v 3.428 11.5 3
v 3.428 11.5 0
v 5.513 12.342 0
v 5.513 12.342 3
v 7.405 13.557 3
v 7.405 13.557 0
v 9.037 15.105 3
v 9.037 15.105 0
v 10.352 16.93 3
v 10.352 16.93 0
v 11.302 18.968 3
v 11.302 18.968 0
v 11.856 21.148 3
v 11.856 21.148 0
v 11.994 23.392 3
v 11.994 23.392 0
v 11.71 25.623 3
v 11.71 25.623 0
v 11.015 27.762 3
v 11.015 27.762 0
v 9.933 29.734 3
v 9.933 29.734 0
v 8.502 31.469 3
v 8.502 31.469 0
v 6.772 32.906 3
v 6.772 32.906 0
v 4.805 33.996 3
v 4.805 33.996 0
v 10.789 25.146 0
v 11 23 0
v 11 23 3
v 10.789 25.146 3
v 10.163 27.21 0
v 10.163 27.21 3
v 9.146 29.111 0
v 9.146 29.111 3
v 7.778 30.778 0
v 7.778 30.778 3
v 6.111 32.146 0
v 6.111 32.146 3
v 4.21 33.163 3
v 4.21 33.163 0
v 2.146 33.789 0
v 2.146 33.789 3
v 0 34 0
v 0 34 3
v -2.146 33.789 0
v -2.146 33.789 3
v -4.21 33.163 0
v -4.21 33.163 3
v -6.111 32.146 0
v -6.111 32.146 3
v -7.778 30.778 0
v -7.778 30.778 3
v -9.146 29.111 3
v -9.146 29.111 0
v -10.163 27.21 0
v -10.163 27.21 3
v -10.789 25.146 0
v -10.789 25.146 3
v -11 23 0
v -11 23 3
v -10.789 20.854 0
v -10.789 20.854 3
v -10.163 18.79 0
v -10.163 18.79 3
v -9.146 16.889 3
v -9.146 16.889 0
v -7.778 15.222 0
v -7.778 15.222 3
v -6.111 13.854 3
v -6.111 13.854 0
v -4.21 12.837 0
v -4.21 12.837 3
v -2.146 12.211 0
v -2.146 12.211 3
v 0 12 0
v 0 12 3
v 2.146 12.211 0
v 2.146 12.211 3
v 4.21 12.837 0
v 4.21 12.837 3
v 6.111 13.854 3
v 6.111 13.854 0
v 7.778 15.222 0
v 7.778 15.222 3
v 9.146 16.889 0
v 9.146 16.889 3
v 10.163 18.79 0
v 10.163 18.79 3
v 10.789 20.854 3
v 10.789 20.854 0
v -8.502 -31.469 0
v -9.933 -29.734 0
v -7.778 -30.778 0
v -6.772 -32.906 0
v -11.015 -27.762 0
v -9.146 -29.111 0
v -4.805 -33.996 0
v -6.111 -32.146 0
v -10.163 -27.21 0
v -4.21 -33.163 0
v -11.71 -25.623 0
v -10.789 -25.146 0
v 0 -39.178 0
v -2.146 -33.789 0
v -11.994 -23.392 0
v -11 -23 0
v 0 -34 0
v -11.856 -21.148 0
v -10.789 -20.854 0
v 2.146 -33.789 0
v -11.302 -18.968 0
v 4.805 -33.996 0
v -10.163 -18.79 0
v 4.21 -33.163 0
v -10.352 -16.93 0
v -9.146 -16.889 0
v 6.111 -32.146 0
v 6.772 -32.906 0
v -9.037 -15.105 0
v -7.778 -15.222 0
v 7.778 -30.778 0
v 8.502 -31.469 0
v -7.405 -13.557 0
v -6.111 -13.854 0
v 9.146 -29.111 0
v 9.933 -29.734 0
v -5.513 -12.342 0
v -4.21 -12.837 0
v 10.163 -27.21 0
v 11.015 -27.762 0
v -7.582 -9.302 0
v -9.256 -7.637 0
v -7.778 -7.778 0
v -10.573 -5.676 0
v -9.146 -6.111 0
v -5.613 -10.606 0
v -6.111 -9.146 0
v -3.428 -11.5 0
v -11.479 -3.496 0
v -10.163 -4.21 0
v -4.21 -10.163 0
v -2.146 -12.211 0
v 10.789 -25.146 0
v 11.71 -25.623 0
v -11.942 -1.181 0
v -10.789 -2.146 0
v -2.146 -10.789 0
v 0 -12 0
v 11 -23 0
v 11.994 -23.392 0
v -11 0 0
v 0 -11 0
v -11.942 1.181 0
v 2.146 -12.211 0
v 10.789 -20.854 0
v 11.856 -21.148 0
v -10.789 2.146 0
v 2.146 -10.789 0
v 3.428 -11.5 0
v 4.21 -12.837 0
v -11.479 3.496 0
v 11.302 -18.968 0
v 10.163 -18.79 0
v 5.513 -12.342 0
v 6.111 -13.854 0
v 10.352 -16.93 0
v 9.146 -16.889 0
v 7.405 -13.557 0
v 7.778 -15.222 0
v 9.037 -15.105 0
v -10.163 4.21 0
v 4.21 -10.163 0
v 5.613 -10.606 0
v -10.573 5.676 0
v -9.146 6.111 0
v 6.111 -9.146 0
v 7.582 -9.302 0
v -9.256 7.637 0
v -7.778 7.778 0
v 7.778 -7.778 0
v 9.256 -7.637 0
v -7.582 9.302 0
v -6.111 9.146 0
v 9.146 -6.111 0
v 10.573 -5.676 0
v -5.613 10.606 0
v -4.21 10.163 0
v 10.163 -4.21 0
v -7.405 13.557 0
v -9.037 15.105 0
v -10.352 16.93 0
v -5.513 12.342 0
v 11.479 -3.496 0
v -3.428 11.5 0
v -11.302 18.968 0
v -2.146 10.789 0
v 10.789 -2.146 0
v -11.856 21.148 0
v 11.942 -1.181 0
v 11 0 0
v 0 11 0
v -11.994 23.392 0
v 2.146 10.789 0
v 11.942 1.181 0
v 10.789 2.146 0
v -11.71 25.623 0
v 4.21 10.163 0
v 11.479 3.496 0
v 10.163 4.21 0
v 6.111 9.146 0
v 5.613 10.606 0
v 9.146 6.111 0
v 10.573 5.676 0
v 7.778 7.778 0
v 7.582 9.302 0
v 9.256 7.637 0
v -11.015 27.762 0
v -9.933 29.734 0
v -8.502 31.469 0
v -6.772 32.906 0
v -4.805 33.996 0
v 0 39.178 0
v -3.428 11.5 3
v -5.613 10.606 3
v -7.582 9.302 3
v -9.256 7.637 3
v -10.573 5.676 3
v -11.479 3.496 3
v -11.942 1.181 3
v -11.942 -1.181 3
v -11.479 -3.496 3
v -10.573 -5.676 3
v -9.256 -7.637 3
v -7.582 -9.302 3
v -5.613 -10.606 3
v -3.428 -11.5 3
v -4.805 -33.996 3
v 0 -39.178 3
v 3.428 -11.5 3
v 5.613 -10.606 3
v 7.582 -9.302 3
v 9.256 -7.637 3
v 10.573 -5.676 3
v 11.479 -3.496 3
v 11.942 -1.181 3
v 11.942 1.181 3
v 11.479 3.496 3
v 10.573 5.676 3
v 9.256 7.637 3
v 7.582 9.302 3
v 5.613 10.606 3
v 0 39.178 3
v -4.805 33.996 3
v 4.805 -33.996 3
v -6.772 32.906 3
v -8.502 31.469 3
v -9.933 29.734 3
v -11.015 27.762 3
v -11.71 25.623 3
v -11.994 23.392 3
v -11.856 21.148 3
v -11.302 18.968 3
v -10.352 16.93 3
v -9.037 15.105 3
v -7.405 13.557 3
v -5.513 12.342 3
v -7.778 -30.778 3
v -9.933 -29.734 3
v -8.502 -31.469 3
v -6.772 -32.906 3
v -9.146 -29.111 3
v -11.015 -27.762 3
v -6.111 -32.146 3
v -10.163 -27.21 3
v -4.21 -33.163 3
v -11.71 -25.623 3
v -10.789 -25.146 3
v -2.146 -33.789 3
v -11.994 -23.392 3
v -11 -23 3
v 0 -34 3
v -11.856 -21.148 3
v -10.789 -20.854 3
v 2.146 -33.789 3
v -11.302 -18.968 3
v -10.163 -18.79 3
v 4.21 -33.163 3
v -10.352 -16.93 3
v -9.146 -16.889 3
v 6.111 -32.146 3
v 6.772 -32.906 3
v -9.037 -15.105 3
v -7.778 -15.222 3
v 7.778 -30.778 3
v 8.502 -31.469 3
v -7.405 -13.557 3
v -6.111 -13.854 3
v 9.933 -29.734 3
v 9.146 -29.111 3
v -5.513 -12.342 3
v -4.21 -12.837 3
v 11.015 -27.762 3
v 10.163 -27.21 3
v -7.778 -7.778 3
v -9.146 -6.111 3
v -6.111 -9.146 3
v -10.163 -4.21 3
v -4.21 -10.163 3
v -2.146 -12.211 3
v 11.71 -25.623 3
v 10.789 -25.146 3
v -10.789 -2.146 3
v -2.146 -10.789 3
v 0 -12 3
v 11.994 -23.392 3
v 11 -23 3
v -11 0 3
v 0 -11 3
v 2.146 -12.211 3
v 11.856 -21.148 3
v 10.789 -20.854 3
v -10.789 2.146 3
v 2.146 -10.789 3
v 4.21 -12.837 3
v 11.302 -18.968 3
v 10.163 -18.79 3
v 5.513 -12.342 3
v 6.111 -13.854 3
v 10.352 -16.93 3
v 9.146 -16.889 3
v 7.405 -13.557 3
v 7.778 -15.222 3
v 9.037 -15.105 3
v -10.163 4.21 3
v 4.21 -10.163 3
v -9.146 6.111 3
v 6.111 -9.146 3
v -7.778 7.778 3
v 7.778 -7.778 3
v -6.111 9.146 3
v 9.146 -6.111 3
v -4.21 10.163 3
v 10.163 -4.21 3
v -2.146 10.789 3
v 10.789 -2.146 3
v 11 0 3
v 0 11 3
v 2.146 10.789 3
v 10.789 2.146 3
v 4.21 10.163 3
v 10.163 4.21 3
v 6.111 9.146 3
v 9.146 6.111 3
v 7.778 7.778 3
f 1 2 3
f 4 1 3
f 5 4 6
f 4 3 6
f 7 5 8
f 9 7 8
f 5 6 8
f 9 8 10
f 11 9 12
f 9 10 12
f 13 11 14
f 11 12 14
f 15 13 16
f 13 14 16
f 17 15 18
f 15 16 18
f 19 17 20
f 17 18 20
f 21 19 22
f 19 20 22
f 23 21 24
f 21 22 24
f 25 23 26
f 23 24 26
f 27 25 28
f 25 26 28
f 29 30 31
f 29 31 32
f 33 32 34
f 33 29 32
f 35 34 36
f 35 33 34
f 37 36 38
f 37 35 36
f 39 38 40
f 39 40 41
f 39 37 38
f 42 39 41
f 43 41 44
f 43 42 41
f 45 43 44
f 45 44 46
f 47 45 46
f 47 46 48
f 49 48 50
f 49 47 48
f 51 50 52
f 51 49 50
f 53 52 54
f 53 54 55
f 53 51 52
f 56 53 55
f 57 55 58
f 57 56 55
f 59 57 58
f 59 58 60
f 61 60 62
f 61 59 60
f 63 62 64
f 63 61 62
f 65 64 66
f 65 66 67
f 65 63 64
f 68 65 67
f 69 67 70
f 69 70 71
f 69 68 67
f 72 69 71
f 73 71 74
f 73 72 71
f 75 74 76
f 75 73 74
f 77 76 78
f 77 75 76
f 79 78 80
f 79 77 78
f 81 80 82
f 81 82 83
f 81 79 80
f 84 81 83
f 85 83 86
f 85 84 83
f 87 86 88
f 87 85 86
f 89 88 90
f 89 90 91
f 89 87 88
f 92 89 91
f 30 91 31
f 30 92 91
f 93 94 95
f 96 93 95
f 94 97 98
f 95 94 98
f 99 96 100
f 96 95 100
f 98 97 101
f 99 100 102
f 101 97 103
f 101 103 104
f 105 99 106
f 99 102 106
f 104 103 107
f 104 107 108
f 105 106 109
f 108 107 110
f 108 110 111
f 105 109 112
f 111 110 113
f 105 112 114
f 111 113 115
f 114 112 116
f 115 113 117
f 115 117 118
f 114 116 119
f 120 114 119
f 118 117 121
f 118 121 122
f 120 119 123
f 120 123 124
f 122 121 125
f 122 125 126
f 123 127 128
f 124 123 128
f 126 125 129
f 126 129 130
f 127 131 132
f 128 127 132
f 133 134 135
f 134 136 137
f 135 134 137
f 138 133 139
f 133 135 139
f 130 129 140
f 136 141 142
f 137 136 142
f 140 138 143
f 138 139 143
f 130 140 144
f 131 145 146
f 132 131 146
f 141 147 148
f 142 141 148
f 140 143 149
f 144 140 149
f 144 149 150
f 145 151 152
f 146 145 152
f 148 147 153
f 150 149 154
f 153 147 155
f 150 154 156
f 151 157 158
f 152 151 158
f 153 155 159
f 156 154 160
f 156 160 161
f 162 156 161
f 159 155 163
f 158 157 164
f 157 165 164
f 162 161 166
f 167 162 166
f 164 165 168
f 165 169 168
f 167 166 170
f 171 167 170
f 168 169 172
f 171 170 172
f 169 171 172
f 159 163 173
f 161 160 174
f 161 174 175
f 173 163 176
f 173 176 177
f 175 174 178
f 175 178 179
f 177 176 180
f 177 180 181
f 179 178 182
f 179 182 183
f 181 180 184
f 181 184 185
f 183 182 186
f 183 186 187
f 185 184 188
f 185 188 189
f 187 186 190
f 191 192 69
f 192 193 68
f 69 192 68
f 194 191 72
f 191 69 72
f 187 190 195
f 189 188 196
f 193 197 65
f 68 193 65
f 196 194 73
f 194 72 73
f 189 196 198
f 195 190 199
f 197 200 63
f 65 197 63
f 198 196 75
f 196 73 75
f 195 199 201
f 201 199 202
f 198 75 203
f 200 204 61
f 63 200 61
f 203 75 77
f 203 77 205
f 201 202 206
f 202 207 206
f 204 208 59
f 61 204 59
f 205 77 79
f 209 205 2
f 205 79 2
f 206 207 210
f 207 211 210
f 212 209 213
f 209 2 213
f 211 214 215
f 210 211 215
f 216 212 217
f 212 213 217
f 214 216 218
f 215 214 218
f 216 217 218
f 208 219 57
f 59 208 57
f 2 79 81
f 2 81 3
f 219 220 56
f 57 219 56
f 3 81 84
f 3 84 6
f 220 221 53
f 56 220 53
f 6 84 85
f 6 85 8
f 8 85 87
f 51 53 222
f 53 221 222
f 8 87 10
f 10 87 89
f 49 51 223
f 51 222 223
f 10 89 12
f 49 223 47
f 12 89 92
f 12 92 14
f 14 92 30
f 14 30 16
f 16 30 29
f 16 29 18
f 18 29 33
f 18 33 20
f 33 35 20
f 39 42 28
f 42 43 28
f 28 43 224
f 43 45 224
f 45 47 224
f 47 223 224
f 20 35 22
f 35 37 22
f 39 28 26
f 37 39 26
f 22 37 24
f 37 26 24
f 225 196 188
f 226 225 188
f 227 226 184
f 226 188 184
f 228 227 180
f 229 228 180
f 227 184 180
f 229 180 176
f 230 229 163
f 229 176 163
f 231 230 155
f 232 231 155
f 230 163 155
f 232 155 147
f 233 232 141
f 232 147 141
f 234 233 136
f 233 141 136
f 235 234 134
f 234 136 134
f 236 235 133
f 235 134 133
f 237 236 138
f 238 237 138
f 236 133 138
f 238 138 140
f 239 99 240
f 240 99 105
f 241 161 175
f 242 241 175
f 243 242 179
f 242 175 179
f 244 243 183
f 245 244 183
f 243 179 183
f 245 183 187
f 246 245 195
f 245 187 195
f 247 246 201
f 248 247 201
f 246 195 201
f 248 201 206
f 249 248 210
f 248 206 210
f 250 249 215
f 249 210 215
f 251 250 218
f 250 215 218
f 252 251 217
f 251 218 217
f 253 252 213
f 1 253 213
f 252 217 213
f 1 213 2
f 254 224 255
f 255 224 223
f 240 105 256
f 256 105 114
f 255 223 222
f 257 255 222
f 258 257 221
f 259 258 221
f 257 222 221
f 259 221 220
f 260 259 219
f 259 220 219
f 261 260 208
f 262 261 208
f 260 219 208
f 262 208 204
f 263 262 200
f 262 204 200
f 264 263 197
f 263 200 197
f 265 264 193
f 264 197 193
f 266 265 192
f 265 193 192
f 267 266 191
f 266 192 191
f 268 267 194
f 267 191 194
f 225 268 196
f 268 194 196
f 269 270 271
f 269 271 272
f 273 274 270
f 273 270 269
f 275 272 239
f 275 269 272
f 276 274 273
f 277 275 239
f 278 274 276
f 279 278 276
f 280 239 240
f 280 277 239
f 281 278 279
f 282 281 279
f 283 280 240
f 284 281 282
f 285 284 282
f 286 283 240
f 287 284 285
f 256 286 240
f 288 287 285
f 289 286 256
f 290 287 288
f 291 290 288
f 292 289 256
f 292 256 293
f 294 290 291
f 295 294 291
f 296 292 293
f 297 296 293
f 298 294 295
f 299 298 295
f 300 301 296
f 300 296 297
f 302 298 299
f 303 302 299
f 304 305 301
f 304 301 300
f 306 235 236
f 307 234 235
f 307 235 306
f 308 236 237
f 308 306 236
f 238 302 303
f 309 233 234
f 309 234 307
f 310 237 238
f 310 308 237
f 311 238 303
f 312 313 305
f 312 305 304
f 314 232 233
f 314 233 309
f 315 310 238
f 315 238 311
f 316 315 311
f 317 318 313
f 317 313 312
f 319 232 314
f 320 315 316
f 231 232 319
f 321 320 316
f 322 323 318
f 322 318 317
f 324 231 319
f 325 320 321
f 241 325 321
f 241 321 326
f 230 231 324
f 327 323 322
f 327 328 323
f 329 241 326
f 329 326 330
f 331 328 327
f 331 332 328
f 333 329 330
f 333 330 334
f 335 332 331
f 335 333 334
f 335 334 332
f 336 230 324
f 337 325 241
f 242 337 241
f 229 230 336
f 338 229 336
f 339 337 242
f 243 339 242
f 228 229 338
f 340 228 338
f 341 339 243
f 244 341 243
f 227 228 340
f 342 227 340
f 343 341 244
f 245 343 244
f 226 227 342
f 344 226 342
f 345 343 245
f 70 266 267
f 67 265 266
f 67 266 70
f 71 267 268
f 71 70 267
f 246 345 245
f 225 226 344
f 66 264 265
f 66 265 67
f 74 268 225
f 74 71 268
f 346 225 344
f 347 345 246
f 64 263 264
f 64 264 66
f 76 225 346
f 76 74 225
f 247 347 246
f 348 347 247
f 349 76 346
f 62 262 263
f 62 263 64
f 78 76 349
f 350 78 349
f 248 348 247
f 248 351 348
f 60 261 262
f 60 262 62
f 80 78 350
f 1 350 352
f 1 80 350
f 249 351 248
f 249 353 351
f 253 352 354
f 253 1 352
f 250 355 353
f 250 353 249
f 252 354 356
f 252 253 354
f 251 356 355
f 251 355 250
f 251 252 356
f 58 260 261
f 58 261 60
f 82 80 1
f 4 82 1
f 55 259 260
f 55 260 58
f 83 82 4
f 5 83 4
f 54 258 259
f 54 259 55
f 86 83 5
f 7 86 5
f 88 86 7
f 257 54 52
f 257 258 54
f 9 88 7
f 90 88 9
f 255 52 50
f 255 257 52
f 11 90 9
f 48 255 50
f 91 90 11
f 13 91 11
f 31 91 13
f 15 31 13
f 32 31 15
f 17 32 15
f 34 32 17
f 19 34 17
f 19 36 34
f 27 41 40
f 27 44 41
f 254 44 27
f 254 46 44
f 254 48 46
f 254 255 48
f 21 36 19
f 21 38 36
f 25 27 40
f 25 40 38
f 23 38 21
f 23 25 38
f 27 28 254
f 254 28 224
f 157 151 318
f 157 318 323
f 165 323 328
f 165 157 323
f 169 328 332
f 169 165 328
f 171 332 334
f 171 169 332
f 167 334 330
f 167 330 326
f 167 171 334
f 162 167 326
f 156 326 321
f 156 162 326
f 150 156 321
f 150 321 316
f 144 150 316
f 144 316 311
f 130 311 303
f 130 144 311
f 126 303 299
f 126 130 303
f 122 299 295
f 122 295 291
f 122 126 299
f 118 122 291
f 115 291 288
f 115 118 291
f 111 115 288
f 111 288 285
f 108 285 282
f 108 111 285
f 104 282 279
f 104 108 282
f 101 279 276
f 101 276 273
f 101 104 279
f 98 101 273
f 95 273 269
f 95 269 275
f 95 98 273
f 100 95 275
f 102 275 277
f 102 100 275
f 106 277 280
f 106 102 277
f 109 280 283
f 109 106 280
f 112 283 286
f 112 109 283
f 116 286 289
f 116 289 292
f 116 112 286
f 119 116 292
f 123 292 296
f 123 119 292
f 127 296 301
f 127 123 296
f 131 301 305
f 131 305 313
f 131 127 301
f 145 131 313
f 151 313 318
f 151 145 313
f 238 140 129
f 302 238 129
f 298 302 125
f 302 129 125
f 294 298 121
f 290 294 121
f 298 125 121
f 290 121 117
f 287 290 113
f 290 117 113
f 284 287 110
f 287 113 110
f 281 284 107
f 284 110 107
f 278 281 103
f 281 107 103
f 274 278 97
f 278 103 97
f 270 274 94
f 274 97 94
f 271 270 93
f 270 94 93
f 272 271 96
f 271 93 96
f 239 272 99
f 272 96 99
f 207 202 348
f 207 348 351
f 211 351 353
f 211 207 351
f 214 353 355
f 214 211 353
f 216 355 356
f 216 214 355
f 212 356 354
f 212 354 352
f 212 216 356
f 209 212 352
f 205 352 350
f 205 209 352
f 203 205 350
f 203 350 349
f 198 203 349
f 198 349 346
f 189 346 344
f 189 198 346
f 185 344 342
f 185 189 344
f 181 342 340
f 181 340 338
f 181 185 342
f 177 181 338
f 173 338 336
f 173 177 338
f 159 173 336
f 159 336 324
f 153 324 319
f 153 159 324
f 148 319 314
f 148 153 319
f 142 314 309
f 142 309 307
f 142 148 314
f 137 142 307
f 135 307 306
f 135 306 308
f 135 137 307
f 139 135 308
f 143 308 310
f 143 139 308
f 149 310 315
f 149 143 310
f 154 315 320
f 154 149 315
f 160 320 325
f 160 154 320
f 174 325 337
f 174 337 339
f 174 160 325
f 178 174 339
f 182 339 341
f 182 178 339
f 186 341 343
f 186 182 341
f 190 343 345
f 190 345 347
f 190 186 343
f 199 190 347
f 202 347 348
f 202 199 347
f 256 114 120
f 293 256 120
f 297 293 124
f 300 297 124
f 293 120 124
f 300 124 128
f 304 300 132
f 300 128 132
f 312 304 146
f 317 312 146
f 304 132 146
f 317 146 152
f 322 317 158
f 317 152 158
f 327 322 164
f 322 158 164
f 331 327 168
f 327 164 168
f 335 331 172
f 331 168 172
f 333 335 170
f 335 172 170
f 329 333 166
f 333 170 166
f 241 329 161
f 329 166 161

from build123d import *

# Parameters (mm, degrees)
F0_R     = 11
F1_DEPTH = 3


with BuildPart() as f1:
    # F0 (on Top) → F1 (new body)
    with BuildSketch(Plane.XY):
        with BuildLine():
            ThreePointArc((-4.80491, 33.996037), (-11.97758, 22.266799), (-3.427827, 11.5))
            ThreePointArc((-3.427827, 11.5), (-12, 0), (-3.427827, -11.5))
            ThreePointArc((-3.427827, -11.5), (-11.97758, -22.266799), (-4.80491, -33.996037))
            Line((-4.80491, -33.996037), (0, -39.177649))
            Line((0, -39.177649), (4.80491, -33.996037))
            ThreePointArc((4.80491, -33.996037), (11.97758, -22.266799), (3.427827, -11.5))
            ThreePointArc((3.427827, -11.5), (12, 0), (3.427827, 11.5))
            ThreePointArc((3.427827, 11.5), (11.97758, 22.266799), (4.80491, 33.996037))
            Line((4.80491, 33.996037), (0, 39.177649))
            Line((0, 39.177649), (-4.80491, 33.996037))
        make_face()
        with Locations((0, -23)):
            Circle(F0_R, mode=Mode.SUBTRACT)
        Circle(F0_R, mode=Mode.SUBTRACT)
        with Locations((0, 23)):
            Circle(F0_R, mode=Mode.SUBTRACT)
    extrude(amount=F1_DEPTH)


solid = f1.part
